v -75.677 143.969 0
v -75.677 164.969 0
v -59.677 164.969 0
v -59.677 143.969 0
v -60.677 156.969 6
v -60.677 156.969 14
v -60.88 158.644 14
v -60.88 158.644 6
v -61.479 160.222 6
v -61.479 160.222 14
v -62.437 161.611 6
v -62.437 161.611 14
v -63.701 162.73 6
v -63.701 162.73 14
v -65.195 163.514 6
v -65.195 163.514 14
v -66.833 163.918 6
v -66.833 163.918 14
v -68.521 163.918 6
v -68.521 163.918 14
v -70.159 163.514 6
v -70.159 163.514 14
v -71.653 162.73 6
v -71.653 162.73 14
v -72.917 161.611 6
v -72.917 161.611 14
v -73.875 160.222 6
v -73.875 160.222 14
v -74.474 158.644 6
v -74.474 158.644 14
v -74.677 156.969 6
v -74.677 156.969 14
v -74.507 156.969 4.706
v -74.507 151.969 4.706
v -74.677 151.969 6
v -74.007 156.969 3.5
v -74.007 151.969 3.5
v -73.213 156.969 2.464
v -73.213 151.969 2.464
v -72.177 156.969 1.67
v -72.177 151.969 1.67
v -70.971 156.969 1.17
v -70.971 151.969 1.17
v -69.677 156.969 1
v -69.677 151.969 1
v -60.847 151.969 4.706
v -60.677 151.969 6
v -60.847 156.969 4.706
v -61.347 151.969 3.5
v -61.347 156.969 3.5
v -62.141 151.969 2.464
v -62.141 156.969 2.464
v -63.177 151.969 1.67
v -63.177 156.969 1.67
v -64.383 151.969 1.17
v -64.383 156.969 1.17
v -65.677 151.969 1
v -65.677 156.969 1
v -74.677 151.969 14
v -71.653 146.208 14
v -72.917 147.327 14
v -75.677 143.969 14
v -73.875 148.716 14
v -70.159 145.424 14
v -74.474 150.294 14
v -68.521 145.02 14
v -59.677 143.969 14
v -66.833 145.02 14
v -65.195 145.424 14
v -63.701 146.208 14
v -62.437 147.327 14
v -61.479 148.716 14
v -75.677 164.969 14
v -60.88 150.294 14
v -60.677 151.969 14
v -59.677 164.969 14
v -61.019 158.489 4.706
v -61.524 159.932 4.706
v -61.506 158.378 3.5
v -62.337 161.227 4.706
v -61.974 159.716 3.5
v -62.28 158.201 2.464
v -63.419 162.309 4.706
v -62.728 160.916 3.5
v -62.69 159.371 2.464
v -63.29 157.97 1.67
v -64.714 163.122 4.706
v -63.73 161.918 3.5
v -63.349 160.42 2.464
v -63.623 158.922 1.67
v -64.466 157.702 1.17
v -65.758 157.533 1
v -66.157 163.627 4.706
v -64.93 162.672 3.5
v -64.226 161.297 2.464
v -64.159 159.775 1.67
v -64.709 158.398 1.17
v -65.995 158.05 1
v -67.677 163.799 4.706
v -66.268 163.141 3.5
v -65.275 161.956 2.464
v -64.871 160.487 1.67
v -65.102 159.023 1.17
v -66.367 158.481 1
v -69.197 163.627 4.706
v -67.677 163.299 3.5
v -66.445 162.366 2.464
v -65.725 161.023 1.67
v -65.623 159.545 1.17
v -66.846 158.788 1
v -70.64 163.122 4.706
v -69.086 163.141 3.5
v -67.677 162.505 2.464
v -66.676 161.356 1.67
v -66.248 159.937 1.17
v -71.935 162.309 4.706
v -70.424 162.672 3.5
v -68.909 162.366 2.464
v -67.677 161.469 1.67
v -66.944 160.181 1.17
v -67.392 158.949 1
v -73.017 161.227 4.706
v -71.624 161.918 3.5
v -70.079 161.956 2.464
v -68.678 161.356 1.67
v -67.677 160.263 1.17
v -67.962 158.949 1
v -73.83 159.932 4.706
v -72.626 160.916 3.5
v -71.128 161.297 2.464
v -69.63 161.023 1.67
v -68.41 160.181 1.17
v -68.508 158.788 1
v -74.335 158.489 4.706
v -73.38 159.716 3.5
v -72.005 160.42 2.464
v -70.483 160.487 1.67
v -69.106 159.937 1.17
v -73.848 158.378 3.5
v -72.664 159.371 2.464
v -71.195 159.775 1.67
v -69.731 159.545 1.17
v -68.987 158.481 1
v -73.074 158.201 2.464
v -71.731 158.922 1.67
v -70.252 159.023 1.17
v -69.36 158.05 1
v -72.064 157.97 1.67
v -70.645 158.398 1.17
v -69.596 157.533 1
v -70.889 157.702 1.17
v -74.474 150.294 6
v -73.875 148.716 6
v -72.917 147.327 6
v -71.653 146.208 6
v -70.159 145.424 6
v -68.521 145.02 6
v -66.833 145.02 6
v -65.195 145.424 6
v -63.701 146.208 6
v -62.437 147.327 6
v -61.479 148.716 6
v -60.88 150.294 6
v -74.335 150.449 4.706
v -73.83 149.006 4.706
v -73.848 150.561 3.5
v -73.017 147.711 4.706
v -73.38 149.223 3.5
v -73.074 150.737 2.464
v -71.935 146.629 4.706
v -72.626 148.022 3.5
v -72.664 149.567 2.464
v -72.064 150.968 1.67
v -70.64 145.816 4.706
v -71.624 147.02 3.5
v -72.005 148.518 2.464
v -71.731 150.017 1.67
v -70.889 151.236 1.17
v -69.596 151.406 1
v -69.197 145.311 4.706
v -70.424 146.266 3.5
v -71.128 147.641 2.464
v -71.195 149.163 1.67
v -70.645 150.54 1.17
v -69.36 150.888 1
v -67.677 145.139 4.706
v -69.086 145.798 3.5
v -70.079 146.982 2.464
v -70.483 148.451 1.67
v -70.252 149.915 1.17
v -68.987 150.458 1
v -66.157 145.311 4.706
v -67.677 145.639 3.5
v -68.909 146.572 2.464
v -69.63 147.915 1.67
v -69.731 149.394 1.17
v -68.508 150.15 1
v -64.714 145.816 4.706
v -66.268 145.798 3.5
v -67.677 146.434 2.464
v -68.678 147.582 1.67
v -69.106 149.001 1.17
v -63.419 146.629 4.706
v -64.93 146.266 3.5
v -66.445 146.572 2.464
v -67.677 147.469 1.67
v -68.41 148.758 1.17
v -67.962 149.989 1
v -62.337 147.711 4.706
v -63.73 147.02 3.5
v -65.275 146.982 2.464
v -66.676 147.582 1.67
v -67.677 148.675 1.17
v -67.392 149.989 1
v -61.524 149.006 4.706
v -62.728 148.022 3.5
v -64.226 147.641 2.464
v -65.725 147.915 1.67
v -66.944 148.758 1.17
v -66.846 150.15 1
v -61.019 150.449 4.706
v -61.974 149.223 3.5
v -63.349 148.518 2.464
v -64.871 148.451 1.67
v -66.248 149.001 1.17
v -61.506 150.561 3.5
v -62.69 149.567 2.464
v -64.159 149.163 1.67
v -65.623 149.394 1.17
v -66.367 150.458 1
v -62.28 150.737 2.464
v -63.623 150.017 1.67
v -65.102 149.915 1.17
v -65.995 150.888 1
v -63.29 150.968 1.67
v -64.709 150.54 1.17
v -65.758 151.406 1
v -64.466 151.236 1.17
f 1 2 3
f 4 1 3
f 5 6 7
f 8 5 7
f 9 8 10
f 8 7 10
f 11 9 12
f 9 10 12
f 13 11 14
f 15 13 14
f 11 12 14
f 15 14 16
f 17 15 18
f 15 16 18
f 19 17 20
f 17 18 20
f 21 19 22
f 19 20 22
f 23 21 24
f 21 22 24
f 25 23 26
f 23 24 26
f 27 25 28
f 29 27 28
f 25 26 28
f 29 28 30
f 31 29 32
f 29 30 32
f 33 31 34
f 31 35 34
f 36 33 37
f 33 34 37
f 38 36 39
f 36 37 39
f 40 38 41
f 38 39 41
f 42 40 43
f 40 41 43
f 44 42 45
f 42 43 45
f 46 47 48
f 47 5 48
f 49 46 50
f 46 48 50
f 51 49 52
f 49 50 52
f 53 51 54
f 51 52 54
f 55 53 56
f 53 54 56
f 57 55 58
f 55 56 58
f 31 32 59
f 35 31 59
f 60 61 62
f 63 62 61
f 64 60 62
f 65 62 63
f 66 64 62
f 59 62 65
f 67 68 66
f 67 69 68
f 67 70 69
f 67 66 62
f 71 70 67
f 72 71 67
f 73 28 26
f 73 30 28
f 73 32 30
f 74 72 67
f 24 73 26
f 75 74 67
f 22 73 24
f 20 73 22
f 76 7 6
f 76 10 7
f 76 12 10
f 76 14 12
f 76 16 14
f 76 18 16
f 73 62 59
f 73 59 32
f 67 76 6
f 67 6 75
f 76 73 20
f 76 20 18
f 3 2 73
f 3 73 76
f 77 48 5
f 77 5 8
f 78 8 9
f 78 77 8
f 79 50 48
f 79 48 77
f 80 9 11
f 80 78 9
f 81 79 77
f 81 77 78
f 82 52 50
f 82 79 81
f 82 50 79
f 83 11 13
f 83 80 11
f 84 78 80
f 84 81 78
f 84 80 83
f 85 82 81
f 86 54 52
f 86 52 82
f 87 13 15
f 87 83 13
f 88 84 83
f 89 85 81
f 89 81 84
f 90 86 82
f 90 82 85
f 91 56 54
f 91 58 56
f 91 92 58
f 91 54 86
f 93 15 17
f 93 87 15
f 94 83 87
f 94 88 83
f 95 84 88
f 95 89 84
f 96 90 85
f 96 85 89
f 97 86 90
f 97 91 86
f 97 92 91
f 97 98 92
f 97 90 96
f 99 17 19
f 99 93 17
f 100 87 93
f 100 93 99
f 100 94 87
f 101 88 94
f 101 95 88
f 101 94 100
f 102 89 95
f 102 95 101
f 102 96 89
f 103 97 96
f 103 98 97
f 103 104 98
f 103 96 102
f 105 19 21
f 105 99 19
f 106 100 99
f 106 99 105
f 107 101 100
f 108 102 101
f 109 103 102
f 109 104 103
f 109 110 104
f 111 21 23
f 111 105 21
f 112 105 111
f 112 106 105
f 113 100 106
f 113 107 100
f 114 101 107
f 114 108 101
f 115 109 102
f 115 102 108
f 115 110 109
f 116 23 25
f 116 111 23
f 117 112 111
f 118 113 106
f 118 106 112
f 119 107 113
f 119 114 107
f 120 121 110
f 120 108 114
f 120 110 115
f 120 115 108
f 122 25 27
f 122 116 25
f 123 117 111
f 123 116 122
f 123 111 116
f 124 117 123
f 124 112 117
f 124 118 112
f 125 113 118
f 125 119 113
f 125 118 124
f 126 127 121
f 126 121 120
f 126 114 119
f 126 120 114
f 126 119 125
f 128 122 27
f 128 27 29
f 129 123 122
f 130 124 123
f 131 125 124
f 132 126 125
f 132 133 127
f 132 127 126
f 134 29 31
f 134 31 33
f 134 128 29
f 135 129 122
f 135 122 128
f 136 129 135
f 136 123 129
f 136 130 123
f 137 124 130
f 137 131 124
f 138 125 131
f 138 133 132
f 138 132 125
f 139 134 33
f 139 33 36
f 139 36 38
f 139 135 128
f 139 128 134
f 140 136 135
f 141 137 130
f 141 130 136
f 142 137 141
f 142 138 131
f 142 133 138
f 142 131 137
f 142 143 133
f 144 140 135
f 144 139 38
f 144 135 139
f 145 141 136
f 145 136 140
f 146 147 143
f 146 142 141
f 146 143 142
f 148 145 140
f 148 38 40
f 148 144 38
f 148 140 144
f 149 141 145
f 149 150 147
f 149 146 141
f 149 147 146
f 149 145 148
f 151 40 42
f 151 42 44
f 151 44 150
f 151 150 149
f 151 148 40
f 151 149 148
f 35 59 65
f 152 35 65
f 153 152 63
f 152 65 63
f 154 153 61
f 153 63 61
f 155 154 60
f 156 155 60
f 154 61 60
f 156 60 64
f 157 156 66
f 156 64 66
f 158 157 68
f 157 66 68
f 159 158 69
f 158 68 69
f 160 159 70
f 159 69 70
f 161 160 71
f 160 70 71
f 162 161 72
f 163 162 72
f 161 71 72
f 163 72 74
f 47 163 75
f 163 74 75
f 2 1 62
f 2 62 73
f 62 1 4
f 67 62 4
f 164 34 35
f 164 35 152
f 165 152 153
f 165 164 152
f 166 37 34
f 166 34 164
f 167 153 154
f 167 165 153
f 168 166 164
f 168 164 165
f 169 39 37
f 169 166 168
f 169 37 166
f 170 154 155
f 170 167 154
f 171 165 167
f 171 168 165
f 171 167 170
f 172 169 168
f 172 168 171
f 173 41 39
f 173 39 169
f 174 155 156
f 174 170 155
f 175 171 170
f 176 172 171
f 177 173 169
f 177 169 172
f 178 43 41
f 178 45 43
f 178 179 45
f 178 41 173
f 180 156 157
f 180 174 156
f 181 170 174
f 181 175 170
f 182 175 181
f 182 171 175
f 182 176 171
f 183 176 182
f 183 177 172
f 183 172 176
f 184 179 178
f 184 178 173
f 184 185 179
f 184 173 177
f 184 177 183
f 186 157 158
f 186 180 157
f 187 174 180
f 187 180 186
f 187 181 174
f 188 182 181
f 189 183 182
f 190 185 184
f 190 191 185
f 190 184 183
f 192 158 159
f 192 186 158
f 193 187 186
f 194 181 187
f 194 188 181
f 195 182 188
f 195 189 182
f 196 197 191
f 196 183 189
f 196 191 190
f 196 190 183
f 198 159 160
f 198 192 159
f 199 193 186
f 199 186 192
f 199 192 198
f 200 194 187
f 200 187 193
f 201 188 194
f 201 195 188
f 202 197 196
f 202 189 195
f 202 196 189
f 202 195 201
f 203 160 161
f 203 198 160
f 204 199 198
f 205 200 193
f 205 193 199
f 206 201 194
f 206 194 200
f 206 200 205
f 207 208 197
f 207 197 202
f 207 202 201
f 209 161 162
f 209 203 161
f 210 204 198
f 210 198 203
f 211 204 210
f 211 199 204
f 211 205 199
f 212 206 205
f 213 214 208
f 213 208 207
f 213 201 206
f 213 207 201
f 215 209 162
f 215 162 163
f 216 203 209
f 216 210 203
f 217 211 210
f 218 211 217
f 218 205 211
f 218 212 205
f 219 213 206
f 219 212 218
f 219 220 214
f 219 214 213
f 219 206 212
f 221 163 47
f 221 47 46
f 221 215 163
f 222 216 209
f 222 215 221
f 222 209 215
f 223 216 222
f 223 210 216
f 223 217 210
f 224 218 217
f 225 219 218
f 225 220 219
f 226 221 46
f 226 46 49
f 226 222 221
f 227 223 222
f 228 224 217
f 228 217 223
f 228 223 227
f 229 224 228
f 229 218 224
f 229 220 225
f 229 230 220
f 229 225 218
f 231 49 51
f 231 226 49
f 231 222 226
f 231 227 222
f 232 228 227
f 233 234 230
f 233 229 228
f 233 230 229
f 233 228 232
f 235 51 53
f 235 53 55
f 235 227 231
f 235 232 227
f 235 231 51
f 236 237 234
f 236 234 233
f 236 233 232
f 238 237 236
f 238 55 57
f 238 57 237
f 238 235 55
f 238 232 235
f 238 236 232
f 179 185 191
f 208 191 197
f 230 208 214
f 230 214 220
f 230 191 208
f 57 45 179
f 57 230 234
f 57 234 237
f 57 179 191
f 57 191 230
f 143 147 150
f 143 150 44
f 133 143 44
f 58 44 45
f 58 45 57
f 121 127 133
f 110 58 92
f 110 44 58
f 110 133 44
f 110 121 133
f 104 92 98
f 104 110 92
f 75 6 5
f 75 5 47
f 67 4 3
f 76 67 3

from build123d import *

# Parameters (mm, degrees)
SKETCH019_W     = 16
SKETCH019_H     = 21
PAD005_DEPTH    = 14
POCKET012_DEPTH = 13
FILLET001_R     = 5


with BuildPart() as part:
    # Sketch019 → Pad005 (new body)
    with BuildSketch(Plane.XY):
        with Locations((-67.67703, 154.469096)):
            Rectangle(SKETCH019_W, SKETCH019_H)
    extrude(amount=PAD005_DEPTH)

    # Sketch020 (on Face6 of Pad005) → Pocket012 (cut)
    with BuildSketch(Plane.XY.offset(14)):
        with BuildLine():
            ThreePointArc((-60.67703, 156.969096), (-67.67703, 163.969096), (-74.67703, 156.969096))
            Line((-74.67703, 156.969096), (-74.67703, 151.969096))
            ThreePointArc((-74.67703, 151.969096), (-67.67703, 144.969096), (-60.67703, 151.969096))
            Line((-60.67703, 156.969096), (-60.67703, 151.969096))
        make_face()
    extrude(amount=-POCKET012_DEPTH, mode=Mode.SUBTRACT)

    # Fillet001
    fillet001_edges = [part.edges().sort_by_distance(p)[0] for p in [
        (-67.67703, 144.969096, 1),
        (-74.67703, 154.469096, 1),
        (-60.67703, 154.469096, 1),
        (-67.67703, 163.969096, 1),
    ]]
    fillet(fillet001_edges, radius=FILLET001_R)


solid = part.part
